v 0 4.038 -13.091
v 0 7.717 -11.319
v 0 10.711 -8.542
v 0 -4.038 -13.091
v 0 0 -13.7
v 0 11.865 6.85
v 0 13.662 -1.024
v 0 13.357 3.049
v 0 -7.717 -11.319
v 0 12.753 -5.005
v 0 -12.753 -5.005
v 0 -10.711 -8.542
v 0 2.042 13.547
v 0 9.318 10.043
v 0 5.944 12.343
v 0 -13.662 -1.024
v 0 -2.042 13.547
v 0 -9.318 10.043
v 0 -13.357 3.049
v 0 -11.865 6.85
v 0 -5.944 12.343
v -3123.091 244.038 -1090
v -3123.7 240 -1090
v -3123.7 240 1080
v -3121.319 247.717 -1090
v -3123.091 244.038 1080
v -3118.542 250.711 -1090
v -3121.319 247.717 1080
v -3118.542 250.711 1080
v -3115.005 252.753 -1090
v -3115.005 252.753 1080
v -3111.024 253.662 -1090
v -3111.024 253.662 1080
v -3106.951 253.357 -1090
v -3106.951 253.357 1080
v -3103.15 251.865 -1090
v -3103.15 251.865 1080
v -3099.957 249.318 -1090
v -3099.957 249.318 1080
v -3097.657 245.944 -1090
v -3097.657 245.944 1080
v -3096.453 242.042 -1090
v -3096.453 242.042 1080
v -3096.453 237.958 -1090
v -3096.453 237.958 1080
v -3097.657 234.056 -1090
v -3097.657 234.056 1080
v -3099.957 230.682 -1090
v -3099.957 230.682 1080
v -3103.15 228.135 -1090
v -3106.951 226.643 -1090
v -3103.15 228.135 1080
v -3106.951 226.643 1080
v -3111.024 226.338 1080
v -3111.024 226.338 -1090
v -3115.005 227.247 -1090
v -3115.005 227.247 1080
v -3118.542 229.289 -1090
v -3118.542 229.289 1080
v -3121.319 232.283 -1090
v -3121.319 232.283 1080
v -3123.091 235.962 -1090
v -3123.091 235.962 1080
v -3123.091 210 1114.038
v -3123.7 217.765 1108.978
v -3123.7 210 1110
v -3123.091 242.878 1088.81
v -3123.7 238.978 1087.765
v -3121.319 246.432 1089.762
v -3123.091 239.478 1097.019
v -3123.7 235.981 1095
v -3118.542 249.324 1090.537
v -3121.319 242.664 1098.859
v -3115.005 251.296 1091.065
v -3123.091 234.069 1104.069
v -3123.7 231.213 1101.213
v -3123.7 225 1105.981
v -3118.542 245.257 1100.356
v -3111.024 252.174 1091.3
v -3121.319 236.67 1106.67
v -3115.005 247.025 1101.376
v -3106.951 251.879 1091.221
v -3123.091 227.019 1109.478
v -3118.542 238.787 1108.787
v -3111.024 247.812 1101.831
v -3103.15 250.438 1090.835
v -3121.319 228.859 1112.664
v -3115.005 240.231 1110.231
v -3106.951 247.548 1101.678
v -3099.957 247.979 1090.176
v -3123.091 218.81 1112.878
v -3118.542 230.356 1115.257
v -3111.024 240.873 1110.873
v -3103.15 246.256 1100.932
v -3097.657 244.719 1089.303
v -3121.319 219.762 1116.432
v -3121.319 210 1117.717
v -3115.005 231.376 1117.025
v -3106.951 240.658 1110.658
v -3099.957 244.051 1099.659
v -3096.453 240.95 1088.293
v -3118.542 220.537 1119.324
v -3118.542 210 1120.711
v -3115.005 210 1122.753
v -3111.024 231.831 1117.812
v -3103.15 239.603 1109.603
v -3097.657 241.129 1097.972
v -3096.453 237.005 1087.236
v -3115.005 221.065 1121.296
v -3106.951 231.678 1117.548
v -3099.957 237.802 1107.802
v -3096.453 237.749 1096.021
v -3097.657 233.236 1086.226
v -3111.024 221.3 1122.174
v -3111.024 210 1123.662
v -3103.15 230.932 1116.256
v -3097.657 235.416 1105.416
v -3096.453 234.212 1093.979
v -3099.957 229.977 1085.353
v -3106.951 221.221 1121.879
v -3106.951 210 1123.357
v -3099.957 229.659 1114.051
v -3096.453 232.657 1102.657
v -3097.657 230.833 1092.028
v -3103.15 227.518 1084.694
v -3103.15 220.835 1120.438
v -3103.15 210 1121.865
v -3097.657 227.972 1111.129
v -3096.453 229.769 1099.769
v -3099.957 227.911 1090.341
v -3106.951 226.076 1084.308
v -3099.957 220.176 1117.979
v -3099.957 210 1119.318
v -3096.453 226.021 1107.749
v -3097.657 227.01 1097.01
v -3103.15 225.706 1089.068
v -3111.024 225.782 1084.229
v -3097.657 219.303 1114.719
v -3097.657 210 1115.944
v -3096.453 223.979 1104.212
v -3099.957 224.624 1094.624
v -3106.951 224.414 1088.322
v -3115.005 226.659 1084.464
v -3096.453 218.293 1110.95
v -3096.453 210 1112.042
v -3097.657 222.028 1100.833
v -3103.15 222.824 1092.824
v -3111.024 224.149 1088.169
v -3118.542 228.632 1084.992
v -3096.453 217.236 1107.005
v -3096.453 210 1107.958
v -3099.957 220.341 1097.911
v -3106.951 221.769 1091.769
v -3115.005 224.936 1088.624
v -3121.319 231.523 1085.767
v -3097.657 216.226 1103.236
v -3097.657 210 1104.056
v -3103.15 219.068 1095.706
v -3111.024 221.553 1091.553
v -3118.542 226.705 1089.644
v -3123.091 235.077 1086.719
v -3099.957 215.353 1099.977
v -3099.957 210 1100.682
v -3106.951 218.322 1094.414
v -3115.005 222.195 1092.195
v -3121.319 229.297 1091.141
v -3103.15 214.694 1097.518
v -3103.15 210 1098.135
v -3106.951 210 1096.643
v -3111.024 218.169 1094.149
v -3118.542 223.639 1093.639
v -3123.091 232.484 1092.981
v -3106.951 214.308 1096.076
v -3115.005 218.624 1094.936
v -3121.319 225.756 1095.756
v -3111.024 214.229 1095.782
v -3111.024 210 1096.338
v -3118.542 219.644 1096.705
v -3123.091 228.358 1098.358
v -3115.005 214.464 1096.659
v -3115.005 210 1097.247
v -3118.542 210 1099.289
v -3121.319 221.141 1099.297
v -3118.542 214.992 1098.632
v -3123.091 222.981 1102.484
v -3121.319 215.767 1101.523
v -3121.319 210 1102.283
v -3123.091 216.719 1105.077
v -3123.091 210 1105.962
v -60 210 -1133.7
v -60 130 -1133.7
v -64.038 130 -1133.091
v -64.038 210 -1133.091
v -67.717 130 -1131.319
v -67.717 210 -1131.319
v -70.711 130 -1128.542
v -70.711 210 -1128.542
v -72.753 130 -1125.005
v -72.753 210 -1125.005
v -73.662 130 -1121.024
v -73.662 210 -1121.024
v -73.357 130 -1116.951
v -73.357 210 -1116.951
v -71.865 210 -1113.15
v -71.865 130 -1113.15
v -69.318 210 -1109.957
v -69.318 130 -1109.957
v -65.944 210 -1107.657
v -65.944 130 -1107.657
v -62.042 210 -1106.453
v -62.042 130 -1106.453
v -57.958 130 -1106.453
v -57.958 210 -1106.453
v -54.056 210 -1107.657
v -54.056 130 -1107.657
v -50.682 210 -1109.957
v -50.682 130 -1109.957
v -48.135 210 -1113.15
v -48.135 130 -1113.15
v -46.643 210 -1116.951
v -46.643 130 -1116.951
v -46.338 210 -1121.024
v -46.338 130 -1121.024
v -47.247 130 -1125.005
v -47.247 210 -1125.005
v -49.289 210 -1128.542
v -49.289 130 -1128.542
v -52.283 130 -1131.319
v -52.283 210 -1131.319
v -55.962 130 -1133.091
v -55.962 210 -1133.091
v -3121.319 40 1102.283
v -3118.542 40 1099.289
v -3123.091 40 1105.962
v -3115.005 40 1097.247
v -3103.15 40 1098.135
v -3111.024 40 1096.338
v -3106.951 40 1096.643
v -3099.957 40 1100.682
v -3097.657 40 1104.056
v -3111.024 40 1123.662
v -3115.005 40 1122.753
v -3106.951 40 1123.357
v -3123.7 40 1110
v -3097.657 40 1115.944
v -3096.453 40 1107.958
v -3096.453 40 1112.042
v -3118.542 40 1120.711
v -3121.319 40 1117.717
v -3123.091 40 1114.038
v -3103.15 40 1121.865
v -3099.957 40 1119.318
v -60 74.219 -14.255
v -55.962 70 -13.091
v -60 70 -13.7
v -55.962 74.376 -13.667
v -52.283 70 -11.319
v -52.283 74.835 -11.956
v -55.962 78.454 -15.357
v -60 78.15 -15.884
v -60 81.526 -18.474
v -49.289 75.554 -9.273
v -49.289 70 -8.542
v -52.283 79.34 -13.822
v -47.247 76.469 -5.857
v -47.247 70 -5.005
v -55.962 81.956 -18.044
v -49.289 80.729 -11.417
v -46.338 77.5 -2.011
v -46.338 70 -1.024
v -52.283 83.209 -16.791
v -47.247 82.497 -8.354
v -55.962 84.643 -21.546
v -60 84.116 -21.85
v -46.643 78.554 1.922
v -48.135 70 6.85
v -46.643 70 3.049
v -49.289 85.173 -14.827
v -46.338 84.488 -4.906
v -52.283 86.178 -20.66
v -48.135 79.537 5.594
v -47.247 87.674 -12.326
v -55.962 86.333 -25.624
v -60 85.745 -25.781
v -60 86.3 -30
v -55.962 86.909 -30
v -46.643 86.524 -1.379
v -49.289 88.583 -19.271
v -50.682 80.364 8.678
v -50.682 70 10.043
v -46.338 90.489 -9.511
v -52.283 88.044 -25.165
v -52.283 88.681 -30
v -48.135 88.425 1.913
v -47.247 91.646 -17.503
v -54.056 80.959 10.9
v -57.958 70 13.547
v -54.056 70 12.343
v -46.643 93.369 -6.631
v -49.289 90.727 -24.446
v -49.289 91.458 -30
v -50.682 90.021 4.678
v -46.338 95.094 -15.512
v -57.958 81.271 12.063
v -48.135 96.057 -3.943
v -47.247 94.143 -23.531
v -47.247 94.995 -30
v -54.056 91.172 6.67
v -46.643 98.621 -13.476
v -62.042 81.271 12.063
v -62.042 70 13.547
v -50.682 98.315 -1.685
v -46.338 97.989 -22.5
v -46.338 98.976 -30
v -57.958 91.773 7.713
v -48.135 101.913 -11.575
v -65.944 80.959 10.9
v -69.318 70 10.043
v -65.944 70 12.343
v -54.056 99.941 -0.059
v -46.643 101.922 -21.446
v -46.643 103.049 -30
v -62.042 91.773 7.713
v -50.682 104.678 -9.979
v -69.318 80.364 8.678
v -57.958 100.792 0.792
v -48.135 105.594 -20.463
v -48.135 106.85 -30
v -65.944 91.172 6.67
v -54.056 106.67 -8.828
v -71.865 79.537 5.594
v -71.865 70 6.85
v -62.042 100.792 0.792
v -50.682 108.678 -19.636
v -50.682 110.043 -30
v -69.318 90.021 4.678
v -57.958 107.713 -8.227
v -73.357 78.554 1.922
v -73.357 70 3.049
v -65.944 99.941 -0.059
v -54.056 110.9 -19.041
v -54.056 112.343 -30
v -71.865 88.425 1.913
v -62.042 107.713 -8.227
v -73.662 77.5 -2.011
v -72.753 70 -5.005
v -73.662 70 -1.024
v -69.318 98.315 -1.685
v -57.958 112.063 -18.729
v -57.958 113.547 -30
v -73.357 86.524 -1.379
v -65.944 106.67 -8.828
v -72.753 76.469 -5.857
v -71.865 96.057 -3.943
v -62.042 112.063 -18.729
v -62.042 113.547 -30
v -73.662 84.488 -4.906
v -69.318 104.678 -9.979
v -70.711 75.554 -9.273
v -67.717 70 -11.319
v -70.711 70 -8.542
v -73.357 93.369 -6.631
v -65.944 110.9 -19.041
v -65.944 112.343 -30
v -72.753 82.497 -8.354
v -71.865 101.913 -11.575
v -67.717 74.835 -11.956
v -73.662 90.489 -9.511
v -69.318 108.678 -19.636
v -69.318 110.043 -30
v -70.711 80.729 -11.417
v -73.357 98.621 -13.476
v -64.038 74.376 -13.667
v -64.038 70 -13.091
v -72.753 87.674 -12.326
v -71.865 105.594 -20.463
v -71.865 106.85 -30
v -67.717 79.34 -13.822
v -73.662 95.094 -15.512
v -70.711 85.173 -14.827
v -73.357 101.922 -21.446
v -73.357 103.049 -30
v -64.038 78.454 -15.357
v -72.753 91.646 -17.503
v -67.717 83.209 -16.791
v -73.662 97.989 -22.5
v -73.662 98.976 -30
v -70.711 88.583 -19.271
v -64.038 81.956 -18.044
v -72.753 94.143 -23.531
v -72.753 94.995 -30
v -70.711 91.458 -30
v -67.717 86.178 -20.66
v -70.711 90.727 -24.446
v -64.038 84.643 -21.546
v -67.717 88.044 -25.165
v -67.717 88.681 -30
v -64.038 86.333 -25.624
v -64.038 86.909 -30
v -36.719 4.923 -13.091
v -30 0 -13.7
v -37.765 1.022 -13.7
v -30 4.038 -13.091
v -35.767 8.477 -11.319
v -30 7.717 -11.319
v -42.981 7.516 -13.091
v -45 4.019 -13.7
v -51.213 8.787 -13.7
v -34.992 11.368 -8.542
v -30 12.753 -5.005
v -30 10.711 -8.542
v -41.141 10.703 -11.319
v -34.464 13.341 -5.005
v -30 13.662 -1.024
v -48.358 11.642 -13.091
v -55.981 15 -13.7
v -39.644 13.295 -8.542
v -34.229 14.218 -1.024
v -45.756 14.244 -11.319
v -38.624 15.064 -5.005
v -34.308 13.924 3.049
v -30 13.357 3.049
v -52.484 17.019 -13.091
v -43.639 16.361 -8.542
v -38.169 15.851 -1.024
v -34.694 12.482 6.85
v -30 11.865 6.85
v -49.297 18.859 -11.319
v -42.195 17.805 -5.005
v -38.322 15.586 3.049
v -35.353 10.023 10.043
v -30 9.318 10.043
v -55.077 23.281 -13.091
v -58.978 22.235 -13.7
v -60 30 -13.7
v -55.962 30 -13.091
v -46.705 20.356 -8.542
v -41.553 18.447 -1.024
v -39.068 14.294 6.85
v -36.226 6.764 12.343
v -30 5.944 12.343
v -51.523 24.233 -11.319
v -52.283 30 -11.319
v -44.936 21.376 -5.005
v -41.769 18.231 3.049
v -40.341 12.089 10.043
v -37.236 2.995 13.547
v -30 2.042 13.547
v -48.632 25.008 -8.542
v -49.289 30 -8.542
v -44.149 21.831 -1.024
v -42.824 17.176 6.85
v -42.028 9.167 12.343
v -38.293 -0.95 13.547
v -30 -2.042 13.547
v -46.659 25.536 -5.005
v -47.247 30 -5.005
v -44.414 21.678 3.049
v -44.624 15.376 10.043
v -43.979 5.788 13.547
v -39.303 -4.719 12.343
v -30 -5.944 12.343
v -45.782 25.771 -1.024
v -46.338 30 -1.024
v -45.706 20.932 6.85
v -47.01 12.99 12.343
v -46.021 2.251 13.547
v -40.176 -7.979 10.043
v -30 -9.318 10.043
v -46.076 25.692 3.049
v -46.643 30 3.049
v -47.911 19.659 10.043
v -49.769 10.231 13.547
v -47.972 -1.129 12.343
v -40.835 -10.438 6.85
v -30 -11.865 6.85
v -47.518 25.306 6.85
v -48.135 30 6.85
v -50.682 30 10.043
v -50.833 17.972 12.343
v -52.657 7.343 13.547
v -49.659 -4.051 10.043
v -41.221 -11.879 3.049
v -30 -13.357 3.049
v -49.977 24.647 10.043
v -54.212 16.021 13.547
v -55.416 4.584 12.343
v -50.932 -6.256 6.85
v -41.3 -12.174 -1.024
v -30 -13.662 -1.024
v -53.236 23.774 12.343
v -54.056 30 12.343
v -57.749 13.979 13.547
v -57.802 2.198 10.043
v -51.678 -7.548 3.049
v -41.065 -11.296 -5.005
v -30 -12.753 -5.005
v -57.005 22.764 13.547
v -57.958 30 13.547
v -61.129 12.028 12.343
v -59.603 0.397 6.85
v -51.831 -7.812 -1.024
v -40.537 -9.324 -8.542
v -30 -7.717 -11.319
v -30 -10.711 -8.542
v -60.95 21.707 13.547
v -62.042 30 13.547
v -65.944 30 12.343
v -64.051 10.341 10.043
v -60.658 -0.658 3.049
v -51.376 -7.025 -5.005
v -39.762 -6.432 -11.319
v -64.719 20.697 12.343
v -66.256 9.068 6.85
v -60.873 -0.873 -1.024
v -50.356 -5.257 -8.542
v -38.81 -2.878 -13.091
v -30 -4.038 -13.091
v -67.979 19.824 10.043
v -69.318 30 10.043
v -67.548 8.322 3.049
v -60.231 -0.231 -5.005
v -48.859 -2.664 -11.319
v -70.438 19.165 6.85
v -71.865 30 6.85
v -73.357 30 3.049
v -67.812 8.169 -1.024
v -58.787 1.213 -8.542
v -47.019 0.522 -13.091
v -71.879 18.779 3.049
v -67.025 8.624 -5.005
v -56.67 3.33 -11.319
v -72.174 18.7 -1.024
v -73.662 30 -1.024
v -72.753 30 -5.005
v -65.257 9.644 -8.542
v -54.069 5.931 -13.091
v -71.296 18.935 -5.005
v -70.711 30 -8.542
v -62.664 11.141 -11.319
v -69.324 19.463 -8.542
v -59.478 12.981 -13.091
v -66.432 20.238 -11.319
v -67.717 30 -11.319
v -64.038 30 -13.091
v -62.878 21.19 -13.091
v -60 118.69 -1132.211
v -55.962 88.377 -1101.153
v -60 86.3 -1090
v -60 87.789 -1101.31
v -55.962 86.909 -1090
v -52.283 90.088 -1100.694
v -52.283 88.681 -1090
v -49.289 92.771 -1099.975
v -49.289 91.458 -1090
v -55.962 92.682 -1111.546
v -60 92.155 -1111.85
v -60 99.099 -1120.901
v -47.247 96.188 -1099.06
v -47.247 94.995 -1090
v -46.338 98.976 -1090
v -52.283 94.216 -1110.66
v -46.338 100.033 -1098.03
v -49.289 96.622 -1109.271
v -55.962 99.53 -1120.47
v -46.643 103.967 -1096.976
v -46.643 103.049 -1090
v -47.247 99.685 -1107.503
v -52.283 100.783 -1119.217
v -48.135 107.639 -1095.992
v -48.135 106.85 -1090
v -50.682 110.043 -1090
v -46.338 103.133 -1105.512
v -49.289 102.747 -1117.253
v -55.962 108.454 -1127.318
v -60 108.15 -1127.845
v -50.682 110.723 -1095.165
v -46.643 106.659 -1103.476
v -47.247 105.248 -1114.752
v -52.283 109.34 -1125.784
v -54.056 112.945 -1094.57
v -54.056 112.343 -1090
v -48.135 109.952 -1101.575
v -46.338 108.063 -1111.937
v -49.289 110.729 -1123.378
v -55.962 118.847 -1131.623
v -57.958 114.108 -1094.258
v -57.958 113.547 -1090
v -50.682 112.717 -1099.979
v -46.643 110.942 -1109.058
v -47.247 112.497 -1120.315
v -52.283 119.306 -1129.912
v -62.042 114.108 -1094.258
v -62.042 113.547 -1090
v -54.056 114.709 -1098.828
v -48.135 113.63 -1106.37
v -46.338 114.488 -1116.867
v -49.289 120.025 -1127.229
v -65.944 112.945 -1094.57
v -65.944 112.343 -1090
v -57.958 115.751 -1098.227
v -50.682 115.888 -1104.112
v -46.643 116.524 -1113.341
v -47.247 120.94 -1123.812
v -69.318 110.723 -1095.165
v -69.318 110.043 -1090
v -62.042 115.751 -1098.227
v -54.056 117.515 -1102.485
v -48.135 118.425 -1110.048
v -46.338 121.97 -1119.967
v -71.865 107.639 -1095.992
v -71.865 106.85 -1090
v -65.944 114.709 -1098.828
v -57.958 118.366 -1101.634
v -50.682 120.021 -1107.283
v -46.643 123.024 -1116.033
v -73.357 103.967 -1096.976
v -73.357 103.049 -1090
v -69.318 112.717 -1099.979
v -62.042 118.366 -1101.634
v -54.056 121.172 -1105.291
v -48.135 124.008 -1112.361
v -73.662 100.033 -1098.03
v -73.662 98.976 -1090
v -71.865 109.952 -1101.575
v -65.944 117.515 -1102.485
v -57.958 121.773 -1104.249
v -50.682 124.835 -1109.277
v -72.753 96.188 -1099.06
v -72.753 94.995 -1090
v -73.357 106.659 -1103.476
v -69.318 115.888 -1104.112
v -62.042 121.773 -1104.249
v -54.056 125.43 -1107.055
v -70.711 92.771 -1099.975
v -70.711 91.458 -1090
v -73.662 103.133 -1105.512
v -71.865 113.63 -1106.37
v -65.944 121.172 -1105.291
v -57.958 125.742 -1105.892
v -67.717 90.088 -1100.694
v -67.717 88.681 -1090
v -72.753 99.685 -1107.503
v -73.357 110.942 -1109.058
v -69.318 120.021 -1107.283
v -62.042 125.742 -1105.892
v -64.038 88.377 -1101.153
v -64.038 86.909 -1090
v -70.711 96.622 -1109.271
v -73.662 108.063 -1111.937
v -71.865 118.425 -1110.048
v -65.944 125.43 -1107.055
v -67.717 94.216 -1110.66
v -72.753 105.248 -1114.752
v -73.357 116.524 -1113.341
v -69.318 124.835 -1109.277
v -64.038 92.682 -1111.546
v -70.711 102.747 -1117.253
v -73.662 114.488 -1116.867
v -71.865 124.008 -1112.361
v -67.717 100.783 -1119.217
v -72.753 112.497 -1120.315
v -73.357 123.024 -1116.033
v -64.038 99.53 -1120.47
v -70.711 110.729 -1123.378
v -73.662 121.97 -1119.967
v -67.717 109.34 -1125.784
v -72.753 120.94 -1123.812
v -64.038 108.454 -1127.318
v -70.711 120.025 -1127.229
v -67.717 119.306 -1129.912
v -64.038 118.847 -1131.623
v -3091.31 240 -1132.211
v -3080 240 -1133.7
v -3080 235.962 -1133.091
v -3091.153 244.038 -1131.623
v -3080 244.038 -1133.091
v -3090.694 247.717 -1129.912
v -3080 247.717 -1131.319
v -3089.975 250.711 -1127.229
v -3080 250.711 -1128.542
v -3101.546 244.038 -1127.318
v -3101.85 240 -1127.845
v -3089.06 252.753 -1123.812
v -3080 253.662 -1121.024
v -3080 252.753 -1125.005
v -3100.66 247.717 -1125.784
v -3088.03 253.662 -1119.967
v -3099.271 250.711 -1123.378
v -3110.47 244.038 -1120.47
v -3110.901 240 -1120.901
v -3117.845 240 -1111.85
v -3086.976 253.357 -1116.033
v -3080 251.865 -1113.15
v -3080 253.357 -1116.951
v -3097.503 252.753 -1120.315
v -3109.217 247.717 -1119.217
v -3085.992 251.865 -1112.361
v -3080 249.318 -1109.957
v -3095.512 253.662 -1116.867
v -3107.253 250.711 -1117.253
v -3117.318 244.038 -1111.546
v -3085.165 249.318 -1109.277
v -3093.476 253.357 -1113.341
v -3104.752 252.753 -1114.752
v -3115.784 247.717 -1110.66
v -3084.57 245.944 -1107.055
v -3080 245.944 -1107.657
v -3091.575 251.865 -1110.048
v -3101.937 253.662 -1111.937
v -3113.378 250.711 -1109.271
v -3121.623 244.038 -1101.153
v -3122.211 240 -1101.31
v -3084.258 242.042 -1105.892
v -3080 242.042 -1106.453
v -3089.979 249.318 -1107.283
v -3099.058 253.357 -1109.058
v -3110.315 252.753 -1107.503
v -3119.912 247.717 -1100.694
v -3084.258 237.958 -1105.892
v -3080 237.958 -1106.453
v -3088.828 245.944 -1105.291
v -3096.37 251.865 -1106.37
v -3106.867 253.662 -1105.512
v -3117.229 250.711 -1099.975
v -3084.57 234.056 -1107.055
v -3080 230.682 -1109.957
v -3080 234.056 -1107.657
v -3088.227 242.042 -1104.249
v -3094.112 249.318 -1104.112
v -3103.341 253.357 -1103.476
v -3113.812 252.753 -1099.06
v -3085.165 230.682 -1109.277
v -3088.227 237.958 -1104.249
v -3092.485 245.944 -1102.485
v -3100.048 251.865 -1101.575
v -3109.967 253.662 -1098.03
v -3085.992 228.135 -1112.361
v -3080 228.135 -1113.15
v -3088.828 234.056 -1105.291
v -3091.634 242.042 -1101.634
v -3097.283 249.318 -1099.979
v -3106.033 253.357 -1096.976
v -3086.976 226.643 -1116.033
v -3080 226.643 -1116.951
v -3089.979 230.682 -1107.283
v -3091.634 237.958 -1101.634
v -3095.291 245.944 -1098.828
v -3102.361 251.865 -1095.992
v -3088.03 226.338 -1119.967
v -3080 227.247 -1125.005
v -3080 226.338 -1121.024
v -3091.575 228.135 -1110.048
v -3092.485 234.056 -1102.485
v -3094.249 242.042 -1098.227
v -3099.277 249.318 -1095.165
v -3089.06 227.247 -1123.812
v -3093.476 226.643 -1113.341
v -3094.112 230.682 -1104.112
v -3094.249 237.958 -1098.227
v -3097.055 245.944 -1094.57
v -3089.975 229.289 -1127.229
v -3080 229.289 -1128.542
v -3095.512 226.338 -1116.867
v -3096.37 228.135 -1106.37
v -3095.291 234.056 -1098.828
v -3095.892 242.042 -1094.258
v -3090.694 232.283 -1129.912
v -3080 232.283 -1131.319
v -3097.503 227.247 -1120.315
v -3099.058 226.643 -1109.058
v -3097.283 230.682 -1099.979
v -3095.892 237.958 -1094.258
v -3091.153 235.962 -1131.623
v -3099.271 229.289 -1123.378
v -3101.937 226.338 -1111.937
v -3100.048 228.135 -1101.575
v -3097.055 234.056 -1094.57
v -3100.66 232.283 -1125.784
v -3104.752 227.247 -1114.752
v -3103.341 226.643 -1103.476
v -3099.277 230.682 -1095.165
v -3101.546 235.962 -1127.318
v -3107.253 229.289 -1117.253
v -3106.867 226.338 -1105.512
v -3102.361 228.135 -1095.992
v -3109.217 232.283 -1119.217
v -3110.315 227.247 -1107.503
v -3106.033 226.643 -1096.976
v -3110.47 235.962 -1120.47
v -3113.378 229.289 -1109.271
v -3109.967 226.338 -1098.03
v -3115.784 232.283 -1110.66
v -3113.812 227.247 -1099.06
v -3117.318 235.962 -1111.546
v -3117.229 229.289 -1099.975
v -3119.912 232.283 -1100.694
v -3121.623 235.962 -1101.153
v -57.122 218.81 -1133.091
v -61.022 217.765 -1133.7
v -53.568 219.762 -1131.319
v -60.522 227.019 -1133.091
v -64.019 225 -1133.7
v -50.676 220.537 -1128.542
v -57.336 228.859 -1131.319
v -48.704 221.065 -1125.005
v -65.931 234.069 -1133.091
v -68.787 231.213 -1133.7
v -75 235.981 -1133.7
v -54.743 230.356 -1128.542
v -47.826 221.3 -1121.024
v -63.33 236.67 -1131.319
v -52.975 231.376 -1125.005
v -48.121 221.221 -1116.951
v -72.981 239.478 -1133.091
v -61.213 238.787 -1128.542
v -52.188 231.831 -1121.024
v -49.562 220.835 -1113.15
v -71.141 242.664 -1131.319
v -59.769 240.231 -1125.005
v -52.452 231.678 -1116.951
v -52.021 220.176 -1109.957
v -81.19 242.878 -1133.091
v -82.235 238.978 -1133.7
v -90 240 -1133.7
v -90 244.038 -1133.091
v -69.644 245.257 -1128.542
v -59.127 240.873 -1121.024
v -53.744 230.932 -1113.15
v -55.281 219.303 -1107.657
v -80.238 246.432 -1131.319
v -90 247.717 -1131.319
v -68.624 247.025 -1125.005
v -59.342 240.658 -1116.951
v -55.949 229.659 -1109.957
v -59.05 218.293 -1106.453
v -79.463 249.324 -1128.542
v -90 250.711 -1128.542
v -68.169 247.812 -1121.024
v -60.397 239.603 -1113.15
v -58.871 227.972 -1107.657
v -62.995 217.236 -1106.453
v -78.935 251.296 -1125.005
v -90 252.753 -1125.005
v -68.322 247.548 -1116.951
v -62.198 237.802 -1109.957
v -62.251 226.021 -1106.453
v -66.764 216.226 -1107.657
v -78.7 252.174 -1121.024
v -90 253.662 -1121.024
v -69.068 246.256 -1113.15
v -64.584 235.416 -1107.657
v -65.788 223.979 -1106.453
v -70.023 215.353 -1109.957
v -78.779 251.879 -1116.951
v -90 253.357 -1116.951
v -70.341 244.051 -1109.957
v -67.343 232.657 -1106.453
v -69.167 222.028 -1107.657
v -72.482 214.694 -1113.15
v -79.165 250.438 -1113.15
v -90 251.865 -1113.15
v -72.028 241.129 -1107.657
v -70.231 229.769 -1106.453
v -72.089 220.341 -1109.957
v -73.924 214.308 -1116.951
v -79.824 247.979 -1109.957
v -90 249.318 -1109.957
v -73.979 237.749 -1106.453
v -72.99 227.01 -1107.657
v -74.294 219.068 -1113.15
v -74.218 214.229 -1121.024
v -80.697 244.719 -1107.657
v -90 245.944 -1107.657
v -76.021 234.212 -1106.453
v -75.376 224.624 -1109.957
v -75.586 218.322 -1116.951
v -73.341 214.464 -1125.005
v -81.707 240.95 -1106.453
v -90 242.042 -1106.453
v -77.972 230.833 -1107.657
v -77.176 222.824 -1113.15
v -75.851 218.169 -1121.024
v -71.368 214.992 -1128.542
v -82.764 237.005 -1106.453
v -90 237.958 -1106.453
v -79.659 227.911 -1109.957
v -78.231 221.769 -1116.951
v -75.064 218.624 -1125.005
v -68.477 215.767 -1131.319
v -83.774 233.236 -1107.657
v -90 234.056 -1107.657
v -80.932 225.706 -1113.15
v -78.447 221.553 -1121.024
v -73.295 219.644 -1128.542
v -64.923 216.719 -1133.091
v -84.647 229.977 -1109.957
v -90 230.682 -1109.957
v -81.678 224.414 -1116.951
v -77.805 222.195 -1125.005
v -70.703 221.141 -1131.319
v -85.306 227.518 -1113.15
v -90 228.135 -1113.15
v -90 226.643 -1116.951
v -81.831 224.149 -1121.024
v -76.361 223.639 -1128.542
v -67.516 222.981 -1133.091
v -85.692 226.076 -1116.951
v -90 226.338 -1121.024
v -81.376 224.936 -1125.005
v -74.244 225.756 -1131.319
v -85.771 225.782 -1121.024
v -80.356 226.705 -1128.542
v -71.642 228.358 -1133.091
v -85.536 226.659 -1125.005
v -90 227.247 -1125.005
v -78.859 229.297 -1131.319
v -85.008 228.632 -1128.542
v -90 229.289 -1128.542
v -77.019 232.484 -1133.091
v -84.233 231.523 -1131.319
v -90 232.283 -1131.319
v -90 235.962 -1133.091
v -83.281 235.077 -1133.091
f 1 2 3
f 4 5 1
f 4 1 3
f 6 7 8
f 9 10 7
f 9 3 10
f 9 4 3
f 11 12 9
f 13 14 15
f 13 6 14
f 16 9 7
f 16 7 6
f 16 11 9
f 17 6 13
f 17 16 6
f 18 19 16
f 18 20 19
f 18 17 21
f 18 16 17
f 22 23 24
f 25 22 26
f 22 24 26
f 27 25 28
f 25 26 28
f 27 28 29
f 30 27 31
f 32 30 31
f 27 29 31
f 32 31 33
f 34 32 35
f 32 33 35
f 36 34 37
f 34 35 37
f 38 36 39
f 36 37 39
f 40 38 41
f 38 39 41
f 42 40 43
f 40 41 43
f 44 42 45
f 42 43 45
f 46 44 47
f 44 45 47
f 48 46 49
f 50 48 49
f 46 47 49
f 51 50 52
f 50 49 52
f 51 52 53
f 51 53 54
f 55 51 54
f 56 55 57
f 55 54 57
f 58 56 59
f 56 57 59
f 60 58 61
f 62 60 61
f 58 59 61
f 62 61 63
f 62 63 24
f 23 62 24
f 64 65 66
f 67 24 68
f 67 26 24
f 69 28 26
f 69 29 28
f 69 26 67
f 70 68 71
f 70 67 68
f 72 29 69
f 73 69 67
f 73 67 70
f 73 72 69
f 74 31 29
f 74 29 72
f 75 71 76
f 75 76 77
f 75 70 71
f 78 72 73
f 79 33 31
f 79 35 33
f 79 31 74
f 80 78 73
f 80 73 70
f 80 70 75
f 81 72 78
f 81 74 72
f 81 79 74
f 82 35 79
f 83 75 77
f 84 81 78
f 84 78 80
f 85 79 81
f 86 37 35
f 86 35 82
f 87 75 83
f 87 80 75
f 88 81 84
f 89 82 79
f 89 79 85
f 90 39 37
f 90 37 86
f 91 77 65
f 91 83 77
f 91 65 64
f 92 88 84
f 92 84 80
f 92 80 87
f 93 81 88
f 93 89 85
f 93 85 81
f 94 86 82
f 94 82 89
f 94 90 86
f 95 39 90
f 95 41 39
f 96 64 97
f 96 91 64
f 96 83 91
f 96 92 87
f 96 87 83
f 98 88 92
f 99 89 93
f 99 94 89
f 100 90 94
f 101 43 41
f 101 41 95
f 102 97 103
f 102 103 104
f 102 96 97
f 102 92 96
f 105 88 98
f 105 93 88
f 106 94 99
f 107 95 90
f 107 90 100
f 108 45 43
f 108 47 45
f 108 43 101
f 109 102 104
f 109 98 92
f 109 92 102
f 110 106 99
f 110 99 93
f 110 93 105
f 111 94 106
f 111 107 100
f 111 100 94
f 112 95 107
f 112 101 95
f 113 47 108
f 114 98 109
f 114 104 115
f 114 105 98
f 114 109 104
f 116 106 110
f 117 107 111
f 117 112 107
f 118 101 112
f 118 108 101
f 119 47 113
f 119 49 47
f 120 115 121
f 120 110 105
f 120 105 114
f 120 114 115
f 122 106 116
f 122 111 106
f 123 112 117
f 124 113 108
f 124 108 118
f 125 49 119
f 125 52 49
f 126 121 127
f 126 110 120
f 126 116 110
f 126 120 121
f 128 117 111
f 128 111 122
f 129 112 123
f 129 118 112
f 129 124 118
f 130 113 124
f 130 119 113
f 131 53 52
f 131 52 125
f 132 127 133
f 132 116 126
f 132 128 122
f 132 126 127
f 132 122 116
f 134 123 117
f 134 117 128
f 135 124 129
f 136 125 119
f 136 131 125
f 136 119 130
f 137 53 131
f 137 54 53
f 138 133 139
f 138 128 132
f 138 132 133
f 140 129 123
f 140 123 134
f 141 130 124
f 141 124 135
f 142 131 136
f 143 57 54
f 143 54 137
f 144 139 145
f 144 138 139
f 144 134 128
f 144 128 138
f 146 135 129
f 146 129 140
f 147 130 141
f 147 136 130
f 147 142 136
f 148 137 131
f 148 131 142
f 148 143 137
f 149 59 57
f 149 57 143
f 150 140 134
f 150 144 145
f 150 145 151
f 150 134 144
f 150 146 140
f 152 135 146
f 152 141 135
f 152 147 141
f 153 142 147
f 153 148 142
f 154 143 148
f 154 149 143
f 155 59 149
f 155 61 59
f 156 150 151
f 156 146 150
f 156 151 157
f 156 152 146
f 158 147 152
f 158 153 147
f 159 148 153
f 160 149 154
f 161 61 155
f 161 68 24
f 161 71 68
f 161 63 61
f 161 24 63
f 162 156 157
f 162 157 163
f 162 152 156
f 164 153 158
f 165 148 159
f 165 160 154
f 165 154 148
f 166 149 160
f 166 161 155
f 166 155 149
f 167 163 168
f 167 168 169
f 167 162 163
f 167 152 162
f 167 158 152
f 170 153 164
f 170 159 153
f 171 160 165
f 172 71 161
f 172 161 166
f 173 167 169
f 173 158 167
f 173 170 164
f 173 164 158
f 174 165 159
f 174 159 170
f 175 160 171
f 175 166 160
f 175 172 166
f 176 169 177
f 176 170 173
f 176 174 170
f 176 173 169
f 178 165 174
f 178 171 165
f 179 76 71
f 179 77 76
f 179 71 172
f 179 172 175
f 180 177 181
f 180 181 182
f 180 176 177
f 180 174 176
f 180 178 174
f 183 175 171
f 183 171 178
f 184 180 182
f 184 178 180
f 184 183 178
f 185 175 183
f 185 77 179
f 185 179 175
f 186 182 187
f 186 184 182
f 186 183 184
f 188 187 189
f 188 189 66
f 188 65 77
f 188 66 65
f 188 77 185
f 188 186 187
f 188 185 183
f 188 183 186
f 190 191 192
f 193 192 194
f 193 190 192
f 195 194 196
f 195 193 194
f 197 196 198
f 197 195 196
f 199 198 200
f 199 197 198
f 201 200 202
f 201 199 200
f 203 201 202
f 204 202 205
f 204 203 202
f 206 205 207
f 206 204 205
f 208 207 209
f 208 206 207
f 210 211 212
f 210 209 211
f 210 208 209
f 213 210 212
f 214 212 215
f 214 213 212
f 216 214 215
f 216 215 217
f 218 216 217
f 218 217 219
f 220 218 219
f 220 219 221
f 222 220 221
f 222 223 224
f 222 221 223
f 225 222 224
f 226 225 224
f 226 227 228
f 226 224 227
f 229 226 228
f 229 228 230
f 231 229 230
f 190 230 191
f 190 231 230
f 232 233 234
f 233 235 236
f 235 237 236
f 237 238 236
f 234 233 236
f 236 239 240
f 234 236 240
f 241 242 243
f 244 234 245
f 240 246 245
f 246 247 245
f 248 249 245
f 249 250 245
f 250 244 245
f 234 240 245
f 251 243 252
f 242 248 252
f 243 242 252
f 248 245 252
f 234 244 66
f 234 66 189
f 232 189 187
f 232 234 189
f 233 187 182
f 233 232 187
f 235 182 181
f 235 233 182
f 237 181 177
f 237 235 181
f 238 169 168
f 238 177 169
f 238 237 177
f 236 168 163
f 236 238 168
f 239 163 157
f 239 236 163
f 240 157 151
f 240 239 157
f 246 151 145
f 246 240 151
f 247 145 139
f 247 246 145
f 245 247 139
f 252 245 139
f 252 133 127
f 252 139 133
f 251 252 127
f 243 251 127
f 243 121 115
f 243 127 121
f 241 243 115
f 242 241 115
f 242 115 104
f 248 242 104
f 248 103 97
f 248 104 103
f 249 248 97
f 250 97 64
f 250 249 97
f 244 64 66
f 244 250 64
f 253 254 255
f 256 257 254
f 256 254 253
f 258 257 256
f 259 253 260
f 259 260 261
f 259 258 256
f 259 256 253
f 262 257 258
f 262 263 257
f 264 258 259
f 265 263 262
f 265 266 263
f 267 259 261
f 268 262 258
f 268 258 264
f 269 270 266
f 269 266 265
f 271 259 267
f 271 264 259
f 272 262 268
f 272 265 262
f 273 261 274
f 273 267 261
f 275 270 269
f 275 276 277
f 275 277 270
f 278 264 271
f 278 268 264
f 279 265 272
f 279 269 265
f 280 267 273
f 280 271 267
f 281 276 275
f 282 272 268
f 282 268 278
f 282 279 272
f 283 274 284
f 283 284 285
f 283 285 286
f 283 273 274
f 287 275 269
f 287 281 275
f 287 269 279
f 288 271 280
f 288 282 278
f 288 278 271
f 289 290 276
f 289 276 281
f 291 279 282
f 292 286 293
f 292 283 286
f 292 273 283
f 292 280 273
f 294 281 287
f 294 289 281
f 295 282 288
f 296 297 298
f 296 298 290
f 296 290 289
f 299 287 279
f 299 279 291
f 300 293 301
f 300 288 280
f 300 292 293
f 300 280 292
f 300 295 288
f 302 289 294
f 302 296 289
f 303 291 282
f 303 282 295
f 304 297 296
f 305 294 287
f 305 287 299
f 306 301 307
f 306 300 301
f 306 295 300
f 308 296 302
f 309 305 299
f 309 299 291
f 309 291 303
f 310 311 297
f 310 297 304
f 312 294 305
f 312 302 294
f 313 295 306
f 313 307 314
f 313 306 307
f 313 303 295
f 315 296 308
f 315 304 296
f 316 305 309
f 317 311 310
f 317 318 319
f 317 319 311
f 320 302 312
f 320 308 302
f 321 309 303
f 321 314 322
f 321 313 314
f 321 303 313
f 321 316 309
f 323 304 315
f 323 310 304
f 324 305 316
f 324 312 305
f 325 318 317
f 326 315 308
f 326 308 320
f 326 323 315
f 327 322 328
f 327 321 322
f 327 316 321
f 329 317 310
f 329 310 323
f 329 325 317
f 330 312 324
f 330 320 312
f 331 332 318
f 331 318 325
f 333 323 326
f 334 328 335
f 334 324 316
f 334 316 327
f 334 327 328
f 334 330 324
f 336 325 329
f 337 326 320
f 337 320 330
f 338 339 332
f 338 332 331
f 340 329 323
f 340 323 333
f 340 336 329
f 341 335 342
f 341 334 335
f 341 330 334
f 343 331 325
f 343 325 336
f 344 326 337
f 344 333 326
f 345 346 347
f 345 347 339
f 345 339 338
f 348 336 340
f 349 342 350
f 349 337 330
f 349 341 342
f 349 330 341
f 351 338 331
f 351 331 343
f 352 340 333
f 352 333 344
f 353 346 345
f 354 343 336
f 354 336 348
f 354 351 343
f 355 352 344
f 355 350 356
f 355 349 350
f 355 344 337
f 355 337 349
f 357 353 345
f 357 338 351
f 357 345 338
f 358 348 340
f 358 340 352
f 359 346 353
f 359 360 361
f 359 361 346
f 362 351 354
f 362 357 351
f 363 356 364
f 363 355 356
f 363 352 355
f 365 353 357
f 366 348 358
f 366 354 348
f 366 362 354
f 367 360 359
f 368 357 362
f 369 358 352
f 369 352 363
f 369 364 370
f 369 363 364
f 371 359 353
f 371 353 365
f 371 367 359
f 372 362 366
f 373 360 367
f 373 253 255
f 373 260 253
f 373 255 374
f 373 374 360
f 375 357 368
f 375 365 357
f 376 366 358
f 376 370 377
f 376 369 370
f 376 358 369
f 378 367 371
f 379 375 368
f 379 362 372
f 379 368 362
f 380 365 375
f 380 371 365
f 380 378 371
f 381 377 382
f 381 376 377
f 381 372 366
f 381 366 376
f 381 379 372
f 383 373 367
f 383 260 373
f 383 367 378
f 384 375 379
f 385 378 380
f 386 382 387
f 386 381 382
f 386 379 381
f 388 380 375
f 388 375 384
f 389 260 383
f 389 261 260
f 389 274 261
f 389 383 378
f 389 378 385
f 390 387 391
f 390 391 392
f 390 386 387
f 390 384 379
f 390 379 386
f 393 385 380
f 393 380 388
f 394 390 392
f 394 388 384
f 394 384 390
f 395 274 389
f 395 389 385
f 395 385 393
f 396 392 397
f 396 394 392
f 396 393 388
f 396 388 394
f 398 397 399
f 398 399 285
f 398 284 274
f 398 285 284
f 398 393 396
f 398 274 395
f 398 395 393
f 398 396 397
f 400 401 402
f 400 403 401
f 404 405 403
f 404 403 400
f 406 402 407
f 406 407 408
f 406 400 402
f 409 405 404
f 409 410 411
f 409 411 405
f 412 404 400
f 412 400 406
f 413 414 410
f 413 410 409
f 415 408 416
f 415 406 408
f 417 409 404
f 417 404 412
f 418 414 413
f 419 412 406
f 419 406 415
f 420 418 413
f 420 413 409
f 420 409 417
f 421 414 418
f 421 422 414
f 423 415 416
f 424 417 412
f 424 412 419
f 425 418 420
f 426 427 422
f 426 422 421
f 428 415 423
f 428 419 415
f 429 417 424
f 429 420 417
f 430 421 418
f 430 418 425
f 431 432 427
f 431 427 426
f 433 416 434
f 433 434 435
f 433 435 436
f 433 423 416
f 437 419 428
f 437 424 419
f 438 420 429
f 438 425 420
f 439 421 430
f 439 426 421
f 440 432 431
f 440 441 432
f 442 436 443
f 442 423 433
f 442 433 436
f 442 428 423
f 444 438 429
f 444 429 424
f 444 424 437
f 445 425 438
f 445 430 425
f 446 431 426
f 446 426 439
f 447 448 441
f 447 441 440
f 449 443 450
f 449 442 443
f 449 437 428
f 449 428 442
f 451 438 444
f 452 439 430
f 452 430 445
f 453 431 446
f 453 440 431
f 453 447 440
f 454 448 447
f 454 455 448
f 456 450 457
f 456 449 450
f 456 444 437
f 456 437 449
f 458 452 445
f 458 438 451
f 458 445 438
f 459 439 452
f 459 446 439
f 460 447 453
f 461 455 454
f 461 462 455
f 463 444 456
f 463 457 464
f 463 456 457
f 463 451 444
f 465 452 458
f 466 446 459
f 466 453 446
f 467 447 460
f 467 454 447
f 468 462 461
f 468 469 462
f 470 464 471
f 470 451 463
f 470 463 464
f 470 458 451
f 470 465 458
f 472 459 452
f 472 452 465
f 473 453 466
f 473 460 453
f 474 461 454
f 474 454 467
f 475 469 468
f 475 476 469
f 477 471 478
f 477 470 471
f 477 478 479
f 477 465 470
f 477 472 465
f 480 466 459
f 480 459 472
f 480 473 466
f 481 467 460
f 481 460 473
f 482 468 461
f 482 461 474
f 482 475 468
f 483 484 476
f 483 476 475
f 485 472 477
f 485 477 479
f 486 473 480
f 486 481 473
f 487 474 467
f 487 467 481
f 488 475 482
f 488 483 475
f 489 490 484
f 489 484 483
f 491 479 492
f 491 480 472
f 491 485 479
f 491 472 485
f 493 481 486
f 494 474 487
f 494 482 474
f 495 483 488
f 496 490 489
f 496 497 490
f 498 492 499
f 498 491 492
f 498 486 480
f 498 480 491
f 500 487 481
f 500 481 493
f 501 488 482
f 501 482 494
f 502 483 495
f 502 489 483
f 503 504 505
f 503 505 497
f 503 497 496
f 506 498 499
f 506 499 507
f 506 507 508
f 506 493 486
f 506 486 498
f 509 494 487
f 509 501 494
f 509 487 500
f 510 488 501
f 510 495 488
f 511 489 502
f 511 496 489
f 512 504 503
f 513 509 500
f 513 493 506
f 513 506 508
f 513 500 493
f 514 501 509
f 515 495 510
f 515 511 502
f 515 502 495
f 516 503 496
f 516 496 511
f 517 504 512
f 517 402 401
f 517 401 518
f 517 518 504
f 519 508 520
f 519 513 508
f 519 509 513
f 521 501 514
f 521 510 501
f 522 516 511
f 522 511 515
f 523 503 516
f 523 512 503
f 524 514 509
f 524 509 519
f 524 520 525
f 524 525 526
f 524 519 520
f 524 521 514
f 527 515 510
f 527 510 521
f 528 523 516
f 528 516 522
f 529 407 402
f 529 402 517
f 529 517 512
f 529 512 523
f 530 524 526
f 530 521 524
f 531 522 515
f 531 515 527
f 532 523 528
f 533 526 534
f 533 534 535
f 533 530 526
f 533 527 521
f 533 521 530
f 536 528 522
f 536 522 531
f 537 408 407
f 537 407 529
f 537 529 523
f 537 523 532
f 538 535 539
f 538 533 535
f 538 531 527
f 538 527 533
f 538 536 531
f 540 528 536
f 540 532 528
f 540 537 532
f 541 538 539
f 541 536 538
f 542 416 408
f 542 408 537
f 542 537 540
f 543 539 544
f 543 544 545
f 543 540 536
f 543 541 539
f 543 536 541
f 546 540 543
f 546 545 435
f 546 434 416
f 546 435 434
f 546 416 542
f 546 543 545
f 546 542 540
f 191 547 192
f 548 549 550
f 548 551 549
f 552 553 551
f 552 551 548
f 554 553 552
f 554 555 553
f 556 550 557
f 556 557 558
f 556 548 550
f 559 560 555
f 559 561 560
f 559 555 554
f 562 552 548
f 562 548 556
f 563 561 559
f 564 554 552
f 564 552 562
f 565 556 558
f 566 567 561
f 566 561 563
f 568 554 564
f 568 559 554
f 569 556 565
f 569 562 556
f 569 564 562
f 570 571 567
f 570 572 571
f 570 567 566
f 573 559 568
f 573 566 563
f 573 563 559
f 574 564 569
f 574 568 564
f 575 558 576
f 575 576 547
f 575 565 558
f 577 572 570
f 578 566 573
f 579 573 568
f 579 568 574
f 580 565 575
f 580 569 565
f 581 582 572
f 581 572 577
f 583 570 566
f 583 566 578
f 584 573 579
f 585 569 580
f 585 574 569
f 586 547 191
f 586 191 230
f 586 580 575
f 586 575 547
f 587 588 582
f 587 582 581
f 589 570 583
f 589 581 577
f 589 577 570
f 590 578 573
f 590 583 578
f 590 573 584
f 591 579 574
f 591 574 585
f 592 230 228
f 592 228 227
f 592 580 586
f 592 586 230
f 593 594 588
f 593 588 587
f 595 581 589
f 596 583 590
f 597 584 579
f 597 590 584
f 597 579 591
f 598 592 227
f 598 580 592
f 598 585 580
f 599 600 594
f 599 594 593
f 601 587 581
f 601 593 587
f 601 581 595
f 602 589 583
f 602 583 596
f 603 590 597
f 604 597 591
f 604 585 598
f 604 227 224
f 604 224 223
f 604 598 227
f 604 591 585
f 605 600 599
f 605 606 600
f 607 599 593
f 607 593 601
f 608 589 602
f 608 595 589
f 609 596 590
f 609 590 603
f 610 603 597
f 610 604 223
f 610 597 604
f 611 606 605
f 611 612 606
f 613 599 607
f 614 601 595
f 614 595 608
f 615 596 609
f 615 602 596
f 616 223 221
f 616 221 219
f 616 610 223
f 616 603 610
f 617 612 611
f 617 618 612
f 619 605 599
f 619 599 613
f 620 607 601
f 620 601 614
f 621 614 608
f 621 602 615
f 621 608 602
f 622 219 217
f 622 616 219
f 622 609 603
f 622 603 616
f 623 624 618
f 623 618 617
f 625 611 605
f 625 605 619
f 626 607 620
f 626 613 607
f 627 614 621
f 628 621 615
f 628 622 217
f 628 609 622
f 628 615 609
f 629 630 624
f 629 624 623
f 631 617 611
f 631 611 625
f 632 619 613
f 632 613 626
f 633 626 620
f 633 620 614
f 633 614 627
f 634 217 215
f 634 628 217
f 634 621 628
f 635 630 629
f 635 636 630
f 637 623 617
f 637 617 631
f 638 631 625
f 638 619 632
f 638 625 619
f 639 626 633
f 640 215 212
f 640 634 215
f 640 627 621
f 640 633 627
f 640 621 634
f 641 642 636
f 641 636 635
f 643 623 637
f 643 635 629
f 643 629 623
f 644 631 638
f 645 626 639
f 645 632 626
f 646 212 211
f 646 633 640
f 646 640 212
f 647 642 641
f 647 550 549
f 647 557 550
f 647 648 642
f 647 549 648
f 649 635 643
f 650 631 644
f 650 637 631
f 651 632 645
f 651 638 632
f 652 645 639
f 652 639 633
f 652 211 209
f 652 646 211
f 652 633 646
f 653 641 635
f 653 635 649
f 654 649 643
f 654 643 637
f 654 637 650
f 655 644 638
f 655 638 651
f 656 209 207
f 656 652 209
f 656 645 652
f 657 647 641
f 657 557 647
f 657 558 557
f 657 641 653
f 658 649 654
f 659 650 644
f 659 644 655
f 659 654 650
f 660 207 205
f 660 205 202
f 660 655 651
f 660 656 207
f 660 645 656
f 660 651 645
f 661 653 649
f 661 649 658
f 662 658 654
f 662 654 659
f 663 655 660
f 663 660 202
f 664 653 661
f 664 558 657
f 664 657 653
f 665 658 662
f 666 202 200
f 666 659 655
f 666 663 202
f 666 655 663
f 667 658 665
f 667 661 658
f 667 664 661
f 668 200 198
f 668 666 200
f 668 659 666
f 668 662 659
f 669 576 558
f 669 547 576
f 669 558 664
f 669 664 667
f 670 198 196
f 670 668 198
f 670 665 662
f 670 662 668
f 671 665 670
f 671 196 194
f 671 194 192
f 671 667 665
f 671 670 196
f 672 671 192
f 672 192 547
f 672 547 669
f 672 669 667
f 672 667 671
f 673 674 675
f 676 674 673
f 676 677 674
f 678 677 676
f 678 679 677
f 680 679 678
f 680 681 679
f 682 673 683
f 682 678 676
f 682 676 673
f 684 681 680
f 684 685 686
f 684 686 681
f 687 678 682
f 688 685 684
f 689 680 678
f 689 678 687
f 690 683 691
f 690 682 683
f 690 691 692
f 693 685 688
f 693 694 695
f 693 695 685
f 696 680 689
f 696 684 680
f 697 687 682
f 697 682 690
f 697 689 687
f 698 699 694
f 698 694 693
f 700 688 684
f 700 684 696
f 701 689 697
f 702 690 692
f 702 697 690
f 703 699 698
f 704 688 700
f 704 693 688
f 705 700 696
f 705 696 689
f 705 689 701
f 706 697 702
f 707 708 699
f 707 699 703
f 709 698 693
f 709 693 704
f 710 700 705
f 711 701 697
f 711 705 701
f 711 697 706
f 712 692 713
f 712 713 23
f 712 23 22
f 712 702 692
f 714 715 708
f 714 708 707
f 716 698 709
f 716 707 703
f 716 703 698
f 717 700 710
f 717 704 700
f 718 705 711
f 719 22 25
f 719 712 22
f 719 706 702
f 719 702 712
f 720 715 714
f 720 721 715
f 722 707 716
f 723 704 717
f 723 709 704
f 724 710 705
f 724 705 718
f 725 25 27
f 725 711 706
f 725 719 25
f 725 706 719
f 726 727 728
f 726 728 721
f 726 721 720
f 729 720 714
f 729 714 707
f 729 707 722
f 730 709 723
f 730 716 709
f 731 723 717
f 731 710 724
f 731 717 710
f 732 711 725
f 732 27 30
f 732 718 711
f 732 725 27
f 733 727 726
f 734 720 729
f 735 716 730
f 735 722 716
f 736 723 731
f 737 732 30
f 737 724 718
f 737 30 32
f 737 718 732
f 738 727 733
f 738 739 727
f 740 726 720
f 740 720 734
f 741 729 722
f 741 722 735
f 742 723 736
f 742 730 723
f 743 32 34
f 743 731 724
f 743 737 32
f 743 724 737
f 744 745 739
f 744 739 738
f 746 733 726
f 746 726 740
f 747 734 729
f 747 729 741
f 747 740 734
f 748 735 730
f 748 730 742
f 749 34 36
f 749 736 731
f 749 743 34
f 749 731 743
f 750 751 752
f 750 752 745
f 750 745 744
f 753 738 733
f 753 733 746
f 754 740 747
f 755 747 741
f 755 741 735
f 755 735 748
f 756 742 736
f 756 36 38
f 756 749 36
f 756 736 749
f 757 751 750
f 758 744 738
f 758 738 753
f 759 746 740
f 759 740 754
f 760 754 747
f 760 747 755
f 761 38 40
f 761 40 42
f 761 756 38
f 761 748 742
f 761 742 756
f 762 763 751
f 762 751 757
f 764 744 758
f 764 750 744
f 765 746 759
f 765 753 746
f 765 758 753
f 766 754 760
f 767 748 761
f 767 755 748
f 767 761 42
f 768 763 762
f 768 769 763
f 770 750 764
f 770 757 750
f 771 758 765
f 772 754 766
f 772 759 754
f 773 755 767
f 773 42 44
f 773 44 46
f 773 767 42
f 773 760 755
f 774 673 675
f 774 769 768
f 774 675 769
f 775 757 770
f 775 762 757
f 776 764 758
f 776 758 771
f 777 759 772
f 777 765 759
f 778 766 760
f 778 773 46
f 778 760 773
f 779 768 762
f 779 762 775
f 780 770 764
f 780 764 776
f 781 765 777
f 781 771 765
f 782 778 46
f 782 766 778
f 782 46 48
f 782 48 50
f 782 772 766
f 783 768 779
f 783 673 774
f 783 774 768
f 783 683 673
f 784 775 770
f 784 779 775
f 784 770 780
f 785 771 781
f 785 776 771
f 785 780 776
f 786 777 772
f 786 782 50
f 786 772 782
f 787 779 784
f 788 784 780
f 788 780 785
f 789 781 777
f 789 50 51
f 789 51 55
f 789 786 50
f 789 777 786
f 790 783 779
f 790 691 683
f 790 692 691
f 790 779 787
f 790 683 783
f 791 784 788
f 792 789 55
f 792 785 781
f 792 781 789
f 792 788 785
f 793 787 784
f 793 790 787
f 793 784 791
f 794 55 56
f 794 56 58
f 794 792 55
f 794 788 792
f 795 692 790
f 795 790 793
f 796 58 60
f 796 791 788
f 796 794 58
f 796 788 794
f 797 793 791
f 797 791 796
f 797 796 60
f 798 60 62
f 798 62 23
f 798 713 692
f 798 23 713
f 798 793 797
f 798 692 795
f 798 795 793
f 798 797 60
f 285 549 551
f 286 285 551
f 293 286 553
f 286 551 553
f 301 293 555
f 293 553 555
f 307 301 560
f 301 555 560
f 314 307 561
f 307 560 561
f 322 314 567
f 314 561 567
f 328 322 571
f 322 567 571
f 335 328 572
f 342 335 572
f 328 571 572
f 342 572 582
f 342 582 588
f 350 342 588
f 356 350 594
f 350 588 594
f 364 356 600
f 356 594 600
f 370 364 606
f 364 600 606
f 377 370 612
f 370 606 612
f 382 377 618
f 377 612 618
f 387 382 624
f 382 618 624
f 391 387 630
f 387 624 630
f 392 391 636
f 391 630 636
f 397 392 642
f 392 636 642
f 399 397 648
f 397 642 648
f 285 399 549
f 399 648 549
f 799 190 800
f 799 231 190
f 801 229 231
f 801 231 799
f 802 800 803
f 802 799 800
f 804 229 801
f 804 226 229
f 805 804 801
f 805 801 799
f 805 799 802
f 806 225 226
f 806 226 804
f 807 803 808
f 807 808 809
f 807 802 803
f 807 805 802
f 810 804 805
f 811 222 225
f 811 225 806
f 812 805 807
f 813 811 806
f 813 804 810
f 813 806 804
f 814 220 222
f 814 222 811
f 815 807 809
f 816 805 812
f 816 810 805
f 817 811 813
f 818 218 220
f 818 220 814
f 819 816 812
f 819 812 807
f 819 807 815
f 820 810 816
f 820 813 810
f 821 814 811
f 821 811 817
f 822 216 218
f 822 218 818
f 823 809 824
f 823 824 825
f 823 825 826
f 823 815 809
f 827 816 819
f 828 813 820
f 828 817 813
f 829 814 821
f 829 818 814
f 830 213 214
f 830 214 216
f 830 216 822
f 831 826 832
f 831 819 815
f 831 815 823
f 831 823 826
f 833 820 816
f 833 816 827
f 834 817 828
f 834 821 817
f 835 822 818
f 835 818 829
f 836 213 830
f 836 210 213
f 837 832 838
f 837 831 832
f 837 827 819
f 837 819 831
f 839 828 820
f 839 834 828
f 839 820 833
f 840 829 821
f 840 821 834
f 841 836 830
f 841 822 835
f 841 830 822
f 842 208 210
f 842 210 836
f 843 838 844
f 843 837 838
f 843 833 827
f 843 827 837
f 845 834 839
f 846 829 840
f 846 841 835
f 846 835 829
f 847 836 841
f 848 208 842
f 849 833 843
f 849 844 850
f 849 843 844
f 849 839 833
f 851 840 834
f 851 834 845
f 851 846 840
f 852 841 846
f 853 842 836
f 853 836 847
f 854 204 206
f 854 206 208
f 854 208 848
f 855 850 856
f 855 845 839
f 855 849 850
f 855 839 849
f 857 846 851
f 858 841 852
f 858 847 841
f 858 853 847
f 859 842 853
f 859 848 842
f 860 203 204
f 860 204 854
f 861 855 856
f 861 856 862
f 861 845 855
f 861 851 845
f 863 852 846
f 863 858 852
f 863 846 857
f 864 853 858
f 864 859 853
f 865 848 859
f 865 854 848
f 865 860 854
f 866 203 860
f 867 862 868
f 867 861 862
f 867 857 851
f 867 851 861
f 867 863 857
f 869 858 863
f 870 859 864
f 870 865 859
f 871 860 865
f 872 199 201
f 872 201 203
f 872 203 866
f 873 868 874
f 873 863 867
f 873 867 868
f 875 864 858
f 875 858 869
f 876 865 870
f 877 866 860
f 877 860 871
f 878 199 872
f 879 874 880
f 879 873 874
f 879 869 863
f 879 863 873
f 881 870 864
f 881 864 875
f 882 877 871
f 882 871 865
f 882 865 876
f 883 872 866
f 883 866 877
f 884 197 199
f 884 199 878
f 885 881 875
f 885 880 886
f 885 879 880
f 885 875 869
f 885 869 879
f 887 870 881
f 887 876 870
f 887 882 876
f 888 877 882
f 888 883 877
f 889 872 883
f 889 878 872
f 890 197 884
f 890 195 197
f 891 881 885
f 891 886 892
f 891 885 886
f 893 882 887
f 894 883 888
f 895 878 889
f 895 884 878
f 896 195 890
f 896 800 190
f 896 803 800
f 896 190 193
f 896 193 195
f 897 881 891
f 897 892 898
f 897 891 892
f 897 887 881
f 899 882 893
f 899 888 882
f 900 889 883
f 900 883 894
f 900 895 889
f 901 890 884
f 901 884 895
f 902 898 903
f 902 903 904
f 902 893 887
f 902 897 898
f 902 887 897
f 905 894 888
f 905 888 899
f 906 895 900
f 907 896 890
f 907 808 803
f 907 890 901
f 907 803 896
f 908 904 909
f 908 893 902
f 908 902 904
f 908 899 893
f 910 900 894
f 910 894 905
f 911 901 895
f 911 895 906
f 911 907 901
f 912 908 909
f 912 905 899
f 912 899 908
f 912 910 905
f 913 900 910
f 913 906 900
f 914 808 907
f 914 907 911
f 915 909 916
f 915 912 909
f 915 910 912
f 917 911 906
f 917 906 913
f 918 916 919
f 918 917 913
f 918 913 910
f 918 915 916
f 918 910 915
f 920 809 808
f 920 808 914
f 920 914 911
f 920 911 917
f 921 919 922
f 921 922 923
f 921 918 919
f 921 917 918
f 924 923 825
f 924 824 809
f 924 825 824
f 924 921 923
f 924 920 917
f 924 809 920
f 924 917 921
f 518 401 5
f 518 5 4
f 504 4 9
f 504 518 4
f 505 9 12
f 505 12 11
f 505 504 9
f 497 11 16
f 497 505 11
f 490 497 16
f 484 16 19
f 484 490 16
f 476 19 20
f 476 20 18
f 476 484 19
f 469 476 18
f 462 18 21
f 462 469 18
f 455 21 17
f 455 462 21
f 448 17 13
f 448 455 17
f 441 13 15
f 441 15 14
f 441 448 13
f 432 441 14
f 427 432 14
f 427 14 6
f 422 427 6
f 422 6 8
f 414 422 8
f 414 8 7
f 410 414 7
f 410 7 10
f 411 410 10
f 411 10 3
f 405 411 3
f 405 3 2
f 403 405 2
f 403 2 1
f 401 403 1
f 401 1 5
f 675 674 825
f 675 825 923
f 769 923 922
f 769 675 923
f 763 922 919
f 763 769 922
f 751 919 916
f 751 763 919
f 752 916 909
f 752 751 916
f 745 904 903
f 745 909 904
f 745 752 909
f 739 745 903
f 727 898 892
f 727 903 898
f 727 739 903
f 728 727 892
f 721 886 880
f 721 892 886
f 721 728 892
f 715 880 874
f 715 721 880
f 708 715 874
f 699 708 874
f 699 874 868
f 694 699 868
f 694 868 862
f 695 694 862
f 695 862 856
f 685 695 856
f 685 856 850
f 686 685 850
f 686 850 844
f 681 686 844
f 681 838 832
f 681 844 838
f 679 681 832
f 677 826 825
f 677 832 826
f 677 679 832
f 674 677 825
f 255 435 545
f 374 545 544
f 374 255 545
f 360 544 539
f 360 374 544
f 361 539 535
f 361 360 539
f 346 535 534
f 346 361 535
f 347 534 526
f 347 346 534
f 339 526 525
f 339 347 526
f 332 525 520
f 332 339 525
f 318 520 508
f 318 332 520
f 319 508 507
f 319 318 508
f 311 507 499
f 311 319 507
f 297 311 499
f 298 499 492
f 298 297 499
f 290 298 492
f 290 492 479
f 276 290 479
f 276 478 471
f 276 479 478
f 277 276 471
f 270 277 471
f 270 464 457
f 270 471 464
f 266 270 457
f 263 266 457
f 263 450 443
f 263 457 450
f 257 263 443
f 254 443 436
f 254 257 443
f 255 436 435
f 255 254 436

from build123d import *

# Parameters (mm, degrees)
CROQUIS1_R = 13.7


with BuildPart() as part:
    # Barrer1: sweep along a curve in space
    with BuildLine() as barrer1_path:
        Line((0, 0, 0), (-30, 0, 0))
        ThreePointArc((-30, 0, 0), (-51.213203436, 8.786796564, 0), (-60, 30, 0))
        Line((-60, 30, 0), (-60, 70, 0))
        ThreePointArc((-60, 70, 0), (-60, 91.213203436, -8.786796564), (-60, 100, -30))
        Line((-60, 100, -30), (-60, 100, -1090))
        ThreePointArc((-60, 130, -1120), (-60, 108.786796564, -1111.213203436), (-60, 100, -1090))
        Line((-60, 130, -1120), (-60, 210, -1120))
        ThreePointArc((-60, 210, -1120), (-68.786796564, 231.213203436, -1120), (-90, 240, -1120))
        Line((-90, 240, -1120), (-3080, 240, -1120))
        ThreePointArc((-3080, 240, -1120), (-3101.213203436, 240, -1111.213203436), (-3110, 240, -1090))
        Line((-3110, 240, -1090), (-3110, 240, 1080))
        ThreePointArc((-3110, 240, 1080), (-3110, 231.213203436, 1101.213203436), (-3110, 210, 1110))
        Line((-3110, 210, 1110), (-3110, 40, 1110))
    # Croquis1 → Barrer1 (sweep)
    with BuildSketch(Plane(origin=(0, 0, 0), x_dir=(0, 0, -1), z_dir=(1, 0, 0))):
        Circle(CROQUIS1_R)
    sweep(path=barrer1_path.line)


solid = part.part
